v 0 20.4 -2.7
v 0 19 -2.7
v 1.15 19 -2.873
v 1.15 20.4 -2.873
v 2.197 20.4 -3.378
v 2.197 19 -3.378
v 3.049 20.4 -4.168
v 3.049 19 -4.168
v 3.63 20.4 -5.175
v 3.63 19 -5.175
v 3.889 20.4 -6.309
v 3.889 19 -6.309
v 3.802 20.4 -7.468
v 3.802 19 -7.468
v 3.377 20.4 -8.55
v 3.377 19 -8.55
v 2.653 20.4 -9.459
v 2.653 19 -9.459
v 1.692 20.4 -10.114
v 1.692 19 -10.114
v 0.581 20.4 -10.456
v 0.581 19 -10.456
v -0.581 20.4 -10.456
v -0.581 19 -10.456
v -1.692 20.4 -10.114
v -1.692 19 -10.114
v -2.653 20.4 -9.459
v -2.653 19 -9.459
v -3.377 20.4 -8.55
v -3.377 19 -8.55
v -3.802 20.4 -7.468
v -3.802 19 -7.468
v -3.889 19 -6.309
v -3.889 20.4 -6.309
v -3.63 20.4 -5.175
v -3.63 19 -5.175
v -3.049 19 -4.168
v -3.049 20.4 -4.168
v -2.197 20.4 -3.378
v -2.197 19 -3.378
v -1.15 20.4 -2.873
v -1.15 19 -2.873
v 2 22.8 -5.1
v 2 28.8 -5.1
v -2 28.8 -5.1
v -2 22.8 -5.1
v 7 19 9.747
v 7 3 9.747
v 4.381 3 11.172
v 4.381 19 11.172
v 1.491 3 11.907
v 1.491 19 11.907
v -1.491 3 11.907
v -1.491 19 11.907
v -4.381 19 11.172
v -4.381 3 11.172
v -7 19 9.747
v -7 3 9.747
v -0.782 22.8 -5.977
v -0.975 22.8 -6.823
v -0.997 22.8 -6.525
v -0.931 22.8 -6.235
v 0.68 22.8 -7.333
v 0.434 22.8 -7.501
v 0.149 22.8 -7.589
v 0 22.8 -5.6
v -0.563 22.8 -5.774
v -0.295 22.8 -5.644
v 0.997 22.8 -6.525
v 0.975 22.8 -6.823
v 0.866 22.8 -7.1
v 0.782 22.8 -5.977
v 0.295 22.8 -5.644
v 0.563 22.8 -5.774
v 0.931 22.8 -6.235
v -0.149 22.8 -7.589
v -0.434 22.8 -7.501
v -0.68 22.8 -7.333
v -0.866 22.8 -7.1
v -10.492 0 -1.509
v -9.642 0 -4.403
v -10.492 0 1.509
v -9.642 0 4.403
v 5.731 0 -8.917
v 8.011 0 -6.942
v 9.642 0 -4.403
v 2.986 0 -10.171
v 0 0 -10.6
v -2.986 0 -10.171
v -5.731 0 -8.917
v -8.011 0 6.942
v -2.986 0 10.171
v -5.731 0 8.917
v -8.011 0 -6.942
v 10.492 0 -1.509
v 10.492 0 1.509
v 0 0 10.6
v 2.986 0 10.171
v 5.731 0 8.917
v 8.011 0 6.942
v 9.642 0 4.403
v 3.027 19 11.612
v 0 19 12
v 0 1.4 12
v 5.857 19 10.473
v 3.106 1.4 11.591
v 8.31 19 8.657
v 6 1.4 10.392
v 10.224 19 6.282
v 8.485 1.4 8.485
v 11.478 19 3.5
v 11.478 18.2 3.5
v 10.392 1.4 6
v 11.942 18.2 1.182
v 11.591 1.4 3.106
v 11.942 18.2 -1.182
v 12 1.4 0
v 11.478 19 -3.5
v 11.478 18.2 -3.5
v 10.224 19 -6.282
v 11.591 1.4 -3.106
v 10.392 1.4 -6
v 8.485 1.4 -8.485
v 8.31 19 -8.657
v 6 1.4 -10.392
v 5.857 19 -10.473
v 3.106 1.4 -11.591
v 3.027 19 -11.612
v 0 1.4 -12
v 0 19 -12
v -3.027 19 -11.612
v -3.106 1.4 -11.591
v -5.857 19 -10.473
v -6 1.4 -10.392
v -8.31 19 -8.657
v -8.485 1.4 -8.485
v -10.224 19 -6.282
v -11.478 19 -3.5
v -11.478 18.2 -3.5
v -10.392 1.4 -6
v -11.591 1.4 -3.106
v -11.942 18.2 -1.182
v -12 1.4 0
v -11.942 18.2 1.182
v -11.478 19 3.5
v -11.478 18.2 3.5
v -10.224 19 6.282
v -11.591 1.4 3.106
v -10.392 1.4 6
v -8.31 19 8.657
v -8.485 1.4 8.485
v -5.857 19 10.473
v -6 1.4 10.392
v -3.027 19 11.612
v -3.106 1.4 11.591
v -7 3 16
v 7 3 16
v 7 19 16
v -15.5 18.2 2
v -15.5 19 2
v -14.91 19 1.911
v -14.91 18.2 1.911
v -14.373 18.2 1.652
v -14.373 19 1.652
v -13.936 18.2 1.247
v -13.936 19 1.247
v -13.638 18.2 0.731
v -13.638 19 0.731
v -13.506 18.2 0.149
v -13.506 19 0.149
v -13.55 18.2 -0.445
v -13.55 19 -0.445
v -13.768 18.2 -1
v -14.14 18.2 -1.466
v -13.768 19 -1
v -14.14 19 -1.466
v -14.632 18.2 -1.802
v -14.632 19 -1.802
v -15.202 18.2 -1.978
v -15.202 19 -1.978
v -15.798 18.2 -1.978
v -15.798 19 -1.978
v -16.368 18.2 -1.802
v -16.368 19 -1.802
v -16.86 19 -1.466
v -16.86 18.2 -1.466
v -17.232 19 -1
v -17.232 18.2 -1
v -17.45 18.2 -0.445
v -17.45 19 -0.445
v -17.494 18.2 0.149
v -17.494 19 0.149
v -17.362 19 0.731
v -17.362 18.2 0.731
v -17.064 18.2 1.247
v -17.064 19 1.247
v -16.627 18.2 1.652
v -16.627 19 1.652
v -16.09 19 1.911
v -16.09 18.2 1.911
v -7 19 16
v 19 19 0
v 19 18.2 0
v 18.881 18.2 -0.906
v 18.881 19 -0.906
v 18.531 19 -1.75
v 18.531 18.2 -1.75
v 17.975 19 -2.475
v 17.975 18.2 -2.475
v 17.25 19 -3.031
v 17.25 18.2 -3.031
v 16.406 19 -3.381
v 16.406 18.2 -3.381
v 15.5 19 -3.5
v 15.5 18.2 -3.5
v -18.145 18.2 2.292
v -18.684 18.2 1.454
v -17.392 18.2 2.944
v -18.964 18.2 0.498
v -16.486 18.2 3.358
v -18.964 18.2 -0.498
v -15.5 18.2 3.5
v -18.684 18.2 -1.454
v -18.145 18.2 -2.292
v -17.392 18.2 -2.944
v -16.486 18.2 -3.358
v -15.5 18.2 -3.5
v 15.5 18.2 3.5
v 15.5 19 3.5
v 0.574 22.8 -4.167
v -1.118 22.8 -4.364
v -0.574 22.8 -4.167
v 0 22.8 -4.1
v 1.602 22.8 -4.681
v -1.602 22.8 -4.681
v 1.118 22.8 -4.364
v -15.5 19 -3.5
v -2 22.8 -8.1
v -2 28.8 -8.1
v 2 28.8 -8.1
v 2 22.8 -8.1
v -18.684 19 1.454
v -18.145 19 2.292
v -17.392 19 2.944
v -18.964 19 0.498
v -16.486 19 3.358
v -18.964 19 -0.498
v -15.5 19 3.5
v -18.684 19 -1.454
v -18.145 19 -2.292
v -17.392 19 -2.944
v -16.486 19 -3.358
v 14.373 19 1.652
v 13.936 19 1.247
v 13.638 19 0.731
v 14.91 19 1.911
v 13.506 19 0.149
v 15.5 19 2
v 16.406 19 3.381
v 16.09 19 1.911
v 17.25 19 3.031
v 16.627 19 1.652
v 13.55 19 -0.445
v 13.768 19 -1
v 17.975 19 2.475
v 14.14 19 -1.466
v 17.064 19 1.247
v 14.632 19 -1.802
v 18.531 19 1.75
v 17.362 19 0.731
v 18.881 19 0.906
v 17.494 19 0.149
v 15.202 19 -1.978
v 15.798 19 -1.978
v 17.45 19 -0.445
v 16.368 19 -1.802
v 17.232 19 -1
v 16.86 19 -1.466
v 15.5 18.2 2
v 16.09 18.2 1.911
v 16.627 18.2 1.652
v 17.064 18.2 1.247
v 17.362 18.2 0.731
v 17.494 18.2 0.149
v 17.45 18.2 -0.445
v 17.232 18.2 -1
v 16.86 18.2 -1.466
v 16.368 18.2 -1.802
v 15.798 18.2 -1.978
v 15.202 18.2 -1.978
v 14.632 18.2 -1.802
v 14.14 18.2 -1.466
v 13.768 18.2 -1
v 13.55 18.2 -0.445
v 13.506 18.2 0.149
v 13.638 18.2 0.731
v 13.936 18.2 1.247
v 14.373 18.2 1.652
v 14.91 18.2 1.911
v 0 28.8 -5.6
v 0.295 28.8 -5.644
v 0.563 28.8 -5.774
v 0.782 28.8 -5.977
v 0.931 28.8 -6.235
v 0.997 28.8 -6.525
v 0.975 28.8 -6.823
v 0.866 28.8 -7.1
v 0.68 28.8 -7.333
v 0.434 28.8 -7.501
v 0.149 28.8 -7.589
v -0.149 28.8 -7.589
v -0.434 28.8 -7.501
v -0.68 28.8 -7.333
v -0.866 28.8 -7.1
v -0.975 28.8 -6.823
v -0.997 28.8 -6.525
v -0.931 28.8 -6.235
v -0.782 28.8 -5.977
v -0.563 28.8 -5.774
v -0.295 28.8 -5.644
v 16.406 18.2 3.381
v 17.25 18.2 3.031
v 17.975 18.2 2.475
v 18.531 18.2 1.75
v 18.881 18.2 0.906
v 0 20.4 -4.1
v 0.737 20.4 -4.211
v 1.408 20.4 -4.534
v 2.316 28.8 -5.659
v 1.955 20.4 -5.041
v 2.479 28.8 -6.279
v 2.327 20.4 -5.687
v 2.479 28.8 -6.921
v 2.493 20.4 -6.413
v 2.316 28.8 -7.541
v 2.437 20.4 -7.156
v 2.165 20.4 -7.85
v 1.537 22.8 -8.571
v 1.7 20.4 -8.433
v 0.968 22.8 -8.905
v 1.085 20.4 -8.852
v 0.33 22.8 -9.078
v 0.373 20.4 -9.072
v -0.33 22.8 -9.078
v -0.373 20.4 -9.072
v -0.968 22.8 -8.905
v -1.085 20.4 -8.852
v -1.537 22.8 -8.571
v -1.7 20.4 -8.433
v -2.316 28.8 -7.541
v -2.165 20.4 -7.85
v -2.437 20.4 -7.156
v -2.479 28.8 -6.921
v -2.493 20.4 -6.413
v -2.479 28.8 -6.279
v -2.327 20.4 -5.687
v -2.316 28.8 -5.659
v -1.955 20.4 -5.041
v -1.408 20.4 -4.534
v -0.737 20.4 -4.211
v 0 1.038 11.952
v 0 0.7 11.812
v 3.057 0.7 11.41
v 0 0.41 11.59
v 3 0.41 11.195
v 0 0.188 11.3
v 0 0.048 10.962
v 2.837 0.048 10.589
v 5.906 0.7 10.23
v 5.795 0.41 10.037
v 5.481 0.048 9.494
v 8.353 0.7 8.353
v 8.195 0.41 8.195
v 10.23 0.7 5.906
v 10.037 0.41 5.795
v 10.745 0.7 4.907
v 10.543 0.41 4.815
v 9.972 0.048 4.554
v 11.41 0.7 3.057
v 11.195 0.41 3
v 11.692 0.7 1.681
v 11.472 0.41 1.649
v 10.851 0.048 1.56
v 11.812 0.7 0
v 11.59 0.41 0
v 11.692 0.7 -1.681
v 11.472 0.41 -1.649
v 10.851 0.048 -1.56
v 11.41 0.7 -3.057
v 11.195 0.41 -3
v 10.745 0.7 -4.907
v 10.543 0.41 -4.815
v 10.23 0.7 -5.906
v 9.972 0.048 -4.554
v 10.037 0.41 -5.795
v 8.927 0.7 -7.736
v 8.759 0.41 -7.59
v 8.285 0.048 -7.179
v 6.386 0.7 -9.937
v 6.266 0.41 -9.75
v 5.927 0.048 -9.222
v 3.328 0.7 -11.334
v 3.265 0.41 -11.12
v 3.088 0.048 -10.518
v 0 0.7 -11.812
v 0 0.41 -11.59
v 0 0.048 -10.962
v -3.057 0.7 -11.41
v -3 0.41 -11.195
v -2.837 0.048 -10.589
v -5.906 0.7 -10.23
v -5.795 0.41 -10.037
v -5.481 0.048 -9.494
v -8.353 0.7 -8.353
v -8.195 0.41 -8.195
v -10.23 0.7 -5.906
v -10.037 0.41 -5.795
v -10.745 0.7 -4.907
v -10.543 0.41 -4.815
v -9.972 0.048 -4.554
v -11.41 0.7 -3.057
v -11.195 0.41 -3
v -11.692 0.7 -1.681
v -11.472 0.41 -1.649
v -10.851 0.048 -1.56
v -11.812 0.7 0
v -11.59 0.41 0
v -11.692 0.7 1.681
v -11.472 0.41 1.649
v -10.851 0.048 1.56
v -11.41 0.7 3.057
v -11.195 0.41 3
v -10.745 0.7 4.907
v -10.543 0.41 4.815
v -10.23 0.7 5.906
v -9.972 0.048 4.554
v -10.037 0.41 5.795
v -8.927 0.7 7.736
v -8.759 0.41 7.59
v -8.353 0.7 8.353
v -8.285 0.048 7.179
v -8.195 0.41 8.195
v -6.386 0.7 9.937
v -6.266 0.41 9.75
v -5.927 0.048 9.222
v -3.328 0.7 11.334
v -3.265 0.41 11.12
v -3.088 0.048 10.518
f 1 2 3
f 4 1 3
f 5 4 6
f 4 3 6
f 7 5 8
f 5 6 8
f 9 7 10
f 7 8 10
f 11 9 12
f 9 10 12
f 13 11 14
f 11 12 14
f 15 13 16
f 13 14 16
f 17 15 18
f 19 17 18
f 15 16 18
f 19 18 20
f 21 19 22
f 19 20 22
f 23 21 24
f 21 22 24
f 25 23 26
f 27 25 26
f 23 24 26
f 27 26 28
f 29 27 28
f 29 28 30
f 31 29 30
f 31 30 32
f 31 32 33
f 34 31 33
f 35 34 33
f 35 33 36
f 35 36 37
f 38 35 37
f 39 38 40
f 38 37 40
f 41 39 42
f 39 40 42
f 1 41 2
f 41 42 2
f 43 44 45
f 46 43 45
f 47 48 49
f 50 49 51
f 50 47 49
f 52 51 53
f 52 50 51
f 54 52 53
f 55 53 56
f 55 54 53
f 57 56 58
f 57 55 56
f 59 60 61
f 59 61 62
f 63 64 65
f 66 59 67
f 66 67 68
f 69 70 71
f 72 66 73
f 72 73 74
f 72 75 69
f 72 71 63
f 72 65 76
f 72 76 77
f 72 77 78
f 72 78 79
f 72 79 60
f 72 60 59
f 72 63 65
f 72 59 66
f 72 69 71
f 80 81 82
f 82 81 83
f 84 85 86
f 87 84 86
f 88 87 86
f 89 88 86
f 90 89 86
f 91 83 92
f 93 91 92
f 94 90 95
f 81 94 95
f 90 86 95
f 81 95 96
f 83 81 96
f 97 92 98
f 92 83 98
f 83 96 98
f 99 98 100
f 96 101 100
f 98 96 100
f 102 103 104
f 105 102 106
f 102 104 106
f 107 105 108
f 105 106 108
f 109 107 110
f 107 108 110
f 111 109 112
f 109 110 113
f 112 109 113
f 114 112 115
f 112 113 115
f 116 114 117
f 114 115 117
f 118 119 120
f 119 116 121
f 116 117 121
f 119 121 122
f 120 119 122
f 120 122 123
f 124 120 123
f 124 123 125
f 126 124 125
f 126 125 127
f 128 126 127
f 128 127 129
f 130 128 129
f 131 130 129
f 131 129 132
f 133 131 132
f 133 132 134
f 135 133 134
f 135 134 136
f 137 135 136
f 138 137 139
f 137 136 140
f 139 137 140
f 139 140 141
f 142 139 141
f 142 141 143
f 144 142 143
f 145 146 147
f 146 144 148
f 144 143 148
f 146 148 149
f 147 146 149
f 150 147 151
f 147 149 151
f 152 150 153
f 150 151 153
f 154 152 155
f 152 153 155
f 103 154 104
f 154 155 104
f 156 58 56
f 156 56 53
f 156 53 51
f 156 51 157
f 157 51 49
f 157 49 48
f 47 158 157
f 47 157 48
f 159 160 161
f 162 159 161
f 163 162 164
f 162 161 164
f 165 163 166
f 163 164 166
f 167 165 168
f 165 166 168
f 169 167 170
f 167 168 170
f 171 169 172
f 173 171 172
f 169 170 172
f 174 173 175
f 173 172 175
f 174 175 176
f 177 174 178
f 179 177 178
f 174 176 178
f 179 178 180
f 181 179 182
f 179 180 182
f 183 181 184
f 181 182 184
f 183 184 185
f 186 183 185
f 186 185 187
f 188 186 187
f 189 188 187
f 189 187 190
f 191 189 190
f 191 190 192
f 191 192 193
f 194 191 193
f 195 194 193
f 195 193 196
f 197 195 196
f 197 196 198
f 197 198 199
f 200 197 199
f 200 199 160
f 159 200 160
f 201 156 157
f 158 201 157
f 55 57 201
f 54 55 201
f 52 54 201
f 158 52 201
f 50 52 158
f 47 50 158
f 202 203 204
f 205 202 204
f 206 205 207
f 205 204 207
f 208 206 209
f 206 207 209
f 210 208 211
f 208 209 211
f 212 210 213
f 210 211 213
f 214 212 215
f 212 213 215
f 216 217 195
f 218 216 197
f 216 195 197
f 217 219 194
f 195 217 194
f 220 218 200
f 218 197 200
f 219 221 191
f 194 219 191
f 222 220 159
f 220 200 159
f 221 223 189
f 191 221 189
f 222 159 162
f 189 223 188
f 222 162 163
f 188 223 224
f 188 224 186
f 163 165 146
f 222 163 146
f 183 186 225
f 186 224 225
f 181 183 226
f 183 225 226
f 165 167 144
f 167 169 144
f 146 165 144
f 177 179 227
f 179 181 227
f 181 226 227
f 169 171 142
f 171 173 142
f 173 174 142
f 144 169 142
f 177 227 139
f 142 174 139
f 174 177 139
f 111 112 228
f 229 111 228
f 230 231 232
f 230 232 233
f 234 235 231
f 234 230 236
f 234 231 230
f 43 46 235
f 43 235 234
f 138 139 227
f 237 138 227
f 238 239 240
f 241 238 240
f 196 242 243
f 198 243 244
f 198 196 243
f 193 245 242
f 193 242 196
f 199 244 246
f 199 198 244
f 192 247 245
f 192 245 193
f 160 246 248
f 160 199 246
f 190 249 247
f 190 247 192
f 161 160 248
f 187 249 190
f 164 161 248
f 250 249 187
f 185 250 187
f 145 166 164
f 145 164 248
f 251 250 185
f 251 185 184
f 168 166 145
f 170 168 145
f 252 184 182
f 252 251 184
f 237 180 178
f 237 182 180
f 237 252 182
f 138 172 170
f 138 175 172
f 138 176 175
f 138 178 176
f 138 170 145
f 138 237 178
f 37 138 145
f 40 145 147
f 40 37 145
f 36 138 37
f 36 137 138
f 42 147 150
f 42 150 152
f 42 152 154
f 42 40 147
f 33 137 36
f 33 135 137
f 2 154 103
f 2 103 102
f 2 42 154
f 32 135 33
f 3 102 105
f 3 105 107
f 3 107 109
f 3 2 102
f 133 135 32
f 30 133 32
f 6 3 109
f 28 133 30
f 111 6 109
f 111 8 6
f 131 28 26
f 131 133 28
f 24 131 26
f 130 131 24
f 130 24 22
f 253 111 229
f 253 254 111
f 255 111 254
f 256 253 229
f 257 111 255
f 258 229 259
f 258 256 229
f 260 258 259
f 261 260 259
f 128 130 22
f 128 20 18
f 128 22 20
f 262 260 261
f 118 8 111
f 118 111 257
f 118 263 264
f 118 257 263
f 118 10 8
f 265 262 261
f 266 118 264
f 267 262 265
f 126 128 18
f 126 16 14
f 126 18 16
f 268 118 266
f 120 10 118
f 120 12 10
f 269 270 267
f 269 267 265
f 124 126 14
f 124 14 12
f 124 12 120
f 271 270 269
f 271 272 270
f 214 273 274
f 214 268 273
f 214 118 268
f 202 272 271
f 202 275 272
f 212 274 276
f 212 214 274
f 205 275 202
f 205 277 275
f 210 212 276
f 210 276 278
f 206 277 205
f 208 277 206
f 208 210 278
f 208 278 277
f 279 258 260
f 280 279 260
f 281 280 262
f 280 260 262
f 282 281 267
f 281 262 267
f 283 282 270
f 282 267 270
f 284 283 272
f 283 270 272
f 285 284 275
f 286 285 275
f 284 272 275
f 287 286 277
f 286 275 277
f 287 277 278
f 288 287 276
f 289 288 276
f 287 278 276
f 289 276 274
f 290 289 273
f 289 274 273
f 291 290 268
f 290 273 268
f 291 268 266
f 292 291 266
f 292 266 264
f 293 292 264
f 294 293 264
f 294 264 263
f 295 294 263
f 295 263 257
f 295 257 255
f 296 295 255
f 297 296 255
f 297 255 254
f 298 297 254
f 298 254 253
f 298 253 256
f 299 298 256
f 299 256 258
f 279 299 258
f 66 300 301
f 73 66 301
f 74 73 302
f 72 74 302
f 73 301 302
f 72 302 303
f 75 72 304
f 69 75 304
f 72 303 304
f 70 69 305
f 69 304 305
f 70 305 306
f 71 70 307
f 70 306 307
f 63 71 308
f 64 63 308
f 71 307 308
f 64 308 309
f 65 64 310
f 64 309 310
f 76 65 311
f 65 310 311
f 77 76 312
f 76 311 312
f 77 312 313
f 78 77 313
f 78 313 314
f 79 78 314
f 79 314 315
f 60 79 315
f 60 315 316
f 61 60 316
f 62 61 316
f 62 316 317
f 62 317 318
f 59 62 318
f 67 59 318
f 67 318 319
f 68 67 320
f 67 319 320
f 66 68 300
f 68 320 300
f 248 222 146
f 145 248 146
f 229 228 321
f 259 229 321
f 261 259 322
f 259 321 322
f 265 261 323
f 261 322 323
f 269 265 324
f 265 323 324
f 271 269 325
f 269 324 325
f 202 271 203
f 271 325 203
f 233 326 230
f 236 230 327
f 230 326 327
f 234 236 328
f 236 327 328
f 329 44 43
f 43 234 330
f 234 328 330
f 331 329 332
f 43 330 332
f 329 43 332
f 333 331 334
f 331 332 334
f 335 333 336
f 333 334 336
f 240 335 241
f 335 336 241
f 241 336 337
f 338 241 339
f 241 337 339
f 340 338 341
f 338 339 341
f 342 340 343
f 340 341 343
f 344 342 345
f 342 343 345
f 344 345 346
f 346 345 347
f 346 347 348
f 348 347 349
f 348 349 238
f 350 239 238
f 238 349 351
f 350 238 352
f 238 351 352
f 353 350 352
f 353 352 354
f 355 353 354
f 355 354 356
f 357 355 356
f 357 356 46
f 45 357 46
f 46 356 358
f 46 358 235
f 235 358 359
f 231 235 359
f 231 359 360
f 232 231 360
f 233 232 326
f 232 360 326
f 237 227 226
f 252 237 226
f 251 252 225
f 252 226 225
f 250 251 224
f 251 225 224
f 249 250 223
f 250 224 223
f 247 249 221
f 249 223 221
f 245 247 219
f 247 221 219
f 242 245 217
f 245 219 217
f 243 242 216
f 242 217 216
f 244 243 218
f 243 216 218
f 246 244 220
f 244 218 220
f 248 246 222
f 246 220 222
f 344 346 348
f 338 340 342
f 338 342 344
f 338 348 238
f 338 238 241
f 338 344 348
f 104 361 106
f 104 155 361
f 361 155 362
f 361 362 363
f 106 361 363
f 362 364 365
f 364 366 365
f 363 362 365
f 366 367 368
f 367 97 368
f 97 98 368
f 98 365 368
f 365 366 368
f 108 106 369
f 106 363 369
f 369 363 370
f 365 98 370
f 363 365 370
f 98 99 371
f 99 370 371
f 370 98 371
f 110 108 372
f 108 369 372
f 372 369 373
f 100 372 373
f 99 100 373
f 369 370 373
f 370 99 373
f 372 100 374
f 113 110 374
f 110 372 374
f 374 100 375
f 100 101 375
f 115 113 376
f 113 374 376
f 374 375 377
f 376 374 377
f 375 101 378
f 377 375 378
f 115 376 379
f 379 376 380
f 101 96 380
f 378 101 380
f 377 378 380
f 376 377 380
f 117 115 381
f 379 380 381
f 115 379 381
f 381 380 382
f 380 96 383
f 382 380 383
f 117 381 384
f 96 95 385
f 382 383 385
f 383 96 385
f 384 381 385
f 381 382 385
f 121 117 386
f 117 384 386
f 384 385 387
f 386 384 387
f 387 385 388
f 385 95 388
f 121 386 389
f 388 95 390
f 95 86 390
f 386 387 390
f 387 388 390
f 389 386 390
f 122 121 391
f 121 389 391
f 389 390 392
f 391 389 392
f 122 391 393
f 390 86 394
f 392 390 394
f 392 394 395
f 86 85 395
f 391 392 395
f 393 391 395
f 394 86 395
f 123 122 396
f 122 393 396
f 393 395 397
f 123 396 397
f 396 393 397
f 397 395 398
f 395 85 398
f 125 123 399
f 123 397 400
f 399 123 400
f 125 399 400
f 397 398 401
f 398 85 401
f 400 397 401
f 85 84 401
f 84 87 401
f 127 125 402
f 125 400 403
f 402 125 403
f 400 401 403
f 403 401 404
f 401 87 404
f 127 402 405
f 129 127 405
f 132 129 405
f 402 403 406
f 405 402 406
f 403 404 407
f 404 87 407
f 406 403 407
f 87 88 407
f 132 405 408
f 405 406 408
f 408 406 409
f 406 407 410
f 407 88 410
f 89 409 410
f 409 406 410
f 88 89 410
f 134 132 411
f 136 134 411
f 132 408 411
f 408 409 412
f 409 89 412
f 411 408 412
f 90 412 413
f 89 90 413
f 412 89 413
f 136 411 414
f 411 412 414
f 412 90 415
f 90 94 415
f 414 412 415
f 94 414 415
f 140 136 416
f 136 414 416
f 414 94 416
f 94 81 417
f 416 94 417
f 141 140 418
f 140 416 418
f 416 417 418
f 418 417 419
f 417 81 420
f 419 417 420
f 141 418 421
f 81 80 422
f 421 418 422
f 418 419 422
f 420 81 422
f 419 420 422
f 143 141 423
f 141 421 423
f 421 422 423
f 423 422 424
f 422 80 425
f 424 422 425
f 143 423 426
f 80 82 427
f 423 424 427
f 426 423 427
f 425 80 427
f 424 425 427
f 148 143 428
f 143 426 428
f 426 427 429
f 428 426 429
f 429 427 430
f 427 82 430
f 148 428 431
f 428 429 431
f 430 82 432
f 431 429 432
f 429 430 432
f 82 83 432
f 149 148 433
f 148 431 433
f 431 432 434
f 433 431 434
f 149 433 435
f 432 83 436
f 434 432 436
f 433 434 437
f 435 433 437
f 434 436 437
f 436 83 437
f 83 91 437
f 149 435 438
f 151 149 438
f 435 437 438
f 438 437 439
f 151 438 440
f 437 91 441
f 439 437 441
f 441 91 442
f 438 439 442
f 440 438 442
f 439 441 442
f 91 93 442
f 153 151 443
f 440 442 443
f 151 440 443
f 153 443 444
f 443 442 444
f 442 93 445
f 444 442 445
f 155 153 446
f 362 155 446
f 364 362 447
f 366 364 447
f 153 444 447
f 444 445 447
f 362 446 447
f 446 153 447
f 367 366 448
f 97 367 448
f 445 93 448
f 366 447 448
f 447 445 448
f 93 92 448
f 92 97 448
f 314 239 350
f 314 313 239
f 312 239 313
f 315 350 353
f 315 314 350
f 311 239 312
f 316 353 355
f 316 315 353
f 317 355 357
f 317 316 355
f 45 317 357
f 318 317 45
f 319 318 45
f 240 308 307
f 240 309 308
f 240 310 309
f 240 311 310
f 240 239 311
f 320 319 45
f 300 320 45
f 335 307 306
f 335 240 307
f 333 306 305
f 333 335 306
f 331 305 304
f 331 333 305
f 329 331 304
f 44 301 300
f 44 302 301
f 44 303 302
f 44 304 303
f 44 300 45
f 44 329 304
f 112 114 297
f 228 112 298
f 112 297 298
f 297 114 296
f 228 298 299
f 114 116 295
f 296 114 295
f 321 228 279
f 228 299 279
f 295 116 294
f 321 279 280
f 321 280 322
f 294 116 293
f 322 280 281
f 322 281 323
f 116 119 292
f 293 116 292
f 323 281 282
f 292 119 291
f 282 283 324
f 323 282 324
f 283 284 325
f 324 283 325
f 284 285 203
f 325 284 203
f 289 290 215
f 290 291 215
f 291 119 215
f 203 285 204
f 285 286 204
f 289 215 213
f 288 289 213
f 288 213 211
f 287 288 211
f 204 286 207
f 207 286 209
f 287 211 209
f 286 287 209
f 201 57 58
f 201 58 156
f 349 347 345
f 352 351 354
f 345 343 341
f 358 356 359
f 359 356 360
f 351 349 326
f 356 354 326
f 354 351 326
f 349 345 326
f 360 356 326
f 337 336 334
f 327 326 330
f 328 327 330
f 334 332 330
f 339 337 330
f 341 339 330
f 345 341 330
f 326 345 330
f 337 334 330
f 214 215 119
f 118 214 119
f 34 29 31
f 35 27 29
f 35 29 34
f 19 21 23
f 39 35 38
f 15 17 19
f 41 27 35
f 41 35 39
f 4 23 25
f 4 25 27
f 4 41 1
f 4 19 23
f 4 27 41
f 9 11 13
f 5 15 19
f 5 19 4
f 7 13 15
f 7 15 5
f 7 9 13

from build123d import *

# Parameters (mm, degrees)
SKETCH1_R           = 12
BOSS_EXTRUDE1_DEPTH = 19
BOSS_EXTRUDE2_DEPTH = 16
BOSS_EXTRUDE3_START = -0.8
BOSS_EXTRUDE3_DEPTH = 0.8
SKETCH4_R           = 2
CUT_EXTRUDE1_DEPTH  = 32.272991542
SKETCH5_R           = 3.9
BOSS_EXTRUDE4_DEPTH = 1.4
SKETCH6_R           = 2.5
BOSS_EXTRUDE5_DEPTH = 8.4
CUT_EXTRUDE2_DEPTH  = 6
SKETCH8_R           = 1
CUT_EXTRUDE3_DEPTH  = 6
FILLET2_R           = 1.4


with BuildPart() as part:
    # Sketch1 → Boss-Extrude1 (new body)
    with BuildSketch(Plane(origin=(0, 0, 0), x_dir=(1, 0, 0), z_dir=(0, 1, 0))):
        with Locations(Location((0, 0, 0), (0, 0, 270))):
            Circle(SKETCH1_R)
    extrude(amount=BOSS_EXTRUDE1_DEPTH)

    # Sketch3 → Boss-Extrude3 (add)
    with BuildSketch(Plane(origin=(0, 19, 0), x_dir=(1, 0, 0), z_dir=(0, 1, 0)).offset(BOSS_EXTRUDE3_START)):
        with BuildLine():
            ThreePointArc((-12, 0), (-13.025126266, 2.474873734), (-15.5, 3.5))
            Line((-15.5, 3.5), (-15.5, -3.5))
            ThreePointArc((-15.5, -3.5), (-13.025126266, -2.474873734), (-12, 0))
        make_face()
        with BuildLine():
            Line((-15.5, -3.5), (-15.5, 3.5))
            ThreePointArc((-15.5, 3.5), (-19, 0), (-15.5, -3.5))
        make_face()
        with BuildLine():
            Line((11.478240283, 3.5), (-11.478240283, 3.5))
            ThreePointArc((-11.478240283, 3.5), (-11.868843318, 1.769338379), (-12, 0))
            ThreePointArc((-12, 0), (-11.868843318, -1.769338379), (-11.478240283, -3.5))
            Line((-11.478240283, -3.5), (11.478240283, -3.5))
            ThreePointArc((11.478240283, -3.5), (11.868843318, -1.769338379), (12, 0))
            ThreePointArc((12, 0), (11.868843318, 1.769338379), (11.478240283, 3.5))
        make_face()
        with BuildLine():
            ThreePointArc((-12, 0), (-13.025126266, -2.474873734), (-15.5, -3.5))
            Line((-15.5, -3.5), (-11.478240283, -3.5))
            ThreePointArc((-11.478240283, -3.5), (-11.868843318, -1.769338379), (-12, 0))
        make_face()
        with BuildLine():
            Line((-11.478240283, 3.5), (-15.5, 3.5))
            ThreePointArc((-15.5, 3.5), (-13.025126266, 2.474873734), (-12, 0))
            ThreePointArc((-12, 0), (-11.868843318, 1.769338379), (-11.478240283, 3.5))
        make_face()
        with BuildLine():
            Line((15.5, 3.5), (11.478240283, 3.5))
            ThreePointArc((11.478240283, 3.5), (11.868843318, 1.769338379), (12, 0))
            ThreePointArc((12, 0), (13.025126266, 2.474873734), (15.5, 3.5))
        make_face()
        with BuildLine():
            ThreePointArc((15.5, -3.5), (13.025126266, -2.474873734), (12, 0))
            ThreePointArc((12, 0), (11.868843318, -1.769338379), (11.478240283, -3.5))
            Line((11.478240283, -3.5), (15.5, -3.5))
        make_face()
        with BuildLine():
            ThreePointArc((19, 0), (17.974873734, 2.474873734), (15.5, 3.5))
            Line((15.5, 3.5), (15.5, -3.5))
            ThreePointArc((15.5, -3.5), (17.974873734, -2.474873734), (19, 0))
        make_face()
        with BuildLine():
            Line((15.5, -3.5), (15.5, 3.5))
            ThreePointArc((15.5, 3.5), (13.025126266, 2.474873734), (12, 0))
            ThreePointArc((12, 0), (13.025126266, -2.474873734), (15.5, -3.5))
        make_face()
    extrude(amount=BOSS_EXTRUDE3_DEPTH)

    # Sketch4 → Cut-Extrude1 (cut, through all)
    with BuildSketch(Plane(origin=(0, 19, 0), x_dir=(1, 0, 0), z_dir=(0, 1, 0))):
        with Locations(Location((15.5, 0, 0), (0, 0, 270))):
            Circle(SKETCH4_R)
        with Locations(Location((-15.5, 0, 0), (0, 0, 270))):
            Circle(SKETCH4_R)
    extrude(amount=-CUT_EXTRUDE1_DEPTH, mode=Mode.SUBTRACT)

    # Sketch5 → Boss-Extrude4 (add)
    with BuildSketch(Plane(origin=(0, 19, 0), x_dir=(1, 0, 0), z_dir=(0, 1, 0))):
        with Locations(Location((0, 6.6, 0), (0, 0, 270))):
            Circle(SKETCH5_R)
    extrude(amount=BOSS_EXTRUDE4_DEPTH)

    # Fillet2
    fillet2_edges = [part.edges().sort_by_distance(p)[0] for p in [
        (0, 0, -12),
    ]]
    fillet(fillet2_edges, radius=FILLET2_R)


with BuildPart() as body_2:
    # Sketch2 → Boss-Extrude2 (new body)
    with BuildSketch(Plane(origin=(0, 19, 0), x_dir=(1, 0, 0), z_dir=(0, 1, 0))):
        with BuildLine():
            ThreePointArc((7, -9.746794345), (0, -12), (-7, -9.746794345))
            Line((-7, -9.746794345), (-7, -16))
            Line((-7, -16), (7, -16))
            Line((7, -16), (7, -9.746794345))
        make_face()
    extrude(amount=-BOSS_EXTRUDE2_DEPTH)


with BuildPart() as body_3:
    # Sketch6 → Boss-Extrude5 (new body)
    with BuildSketch(Plane(origin=(0, 20.4, 0), x_dir=(1, 0, 0), z_dir=(0, 1, 0))):
        with Locations(Location((0, 6.6, 0), (0, 0, 270))):
            Circle(SKETCH6_R)
    extrude(amount=BOSS_EXTRUDE5_DEPTH)

    # Sketch7 → Cut-Extrude2 (cut)
    with BuildSketch(Plane(origin=(0, 28.8, 0), x_dir=(1, 0, 0), z_dir=(0, 1, 0))):
        with BuildLine():
            ThreePointArc((2, 8.1), (0, 9.1), (-2, 8.1))
            Line((-2, 8.1), (2, 8.1))
        make_face()
        with BuildLine():
            Line((2, 5.1), (-2, 5.1))
            ThreePointArc((-2, 5.1), (0, 4.1), (2, 5.1))
        make_face()
    extrude(amount=-CUT_EXTRUDE2_DEPTH, mode=Mode.SUBTRACT)

    # Sketch8 → Cut-Extrude3 (cut)
    with BuildSketch(Plane(origin=(0, 28.8, 0), x_dir=(1, 0, 0), z_dir=(0, 1, 0))):
        with Locations(Location((0, 6.6, 0), (0, 0, 270))):
            Circle(SKETCH8_R)
    extrude(amount=-CUT_EXTRUDE3_DEPTH, mode=Mode.SUBTRACT)


solid = Compound([part.part, body_2.part, body_3.part])
